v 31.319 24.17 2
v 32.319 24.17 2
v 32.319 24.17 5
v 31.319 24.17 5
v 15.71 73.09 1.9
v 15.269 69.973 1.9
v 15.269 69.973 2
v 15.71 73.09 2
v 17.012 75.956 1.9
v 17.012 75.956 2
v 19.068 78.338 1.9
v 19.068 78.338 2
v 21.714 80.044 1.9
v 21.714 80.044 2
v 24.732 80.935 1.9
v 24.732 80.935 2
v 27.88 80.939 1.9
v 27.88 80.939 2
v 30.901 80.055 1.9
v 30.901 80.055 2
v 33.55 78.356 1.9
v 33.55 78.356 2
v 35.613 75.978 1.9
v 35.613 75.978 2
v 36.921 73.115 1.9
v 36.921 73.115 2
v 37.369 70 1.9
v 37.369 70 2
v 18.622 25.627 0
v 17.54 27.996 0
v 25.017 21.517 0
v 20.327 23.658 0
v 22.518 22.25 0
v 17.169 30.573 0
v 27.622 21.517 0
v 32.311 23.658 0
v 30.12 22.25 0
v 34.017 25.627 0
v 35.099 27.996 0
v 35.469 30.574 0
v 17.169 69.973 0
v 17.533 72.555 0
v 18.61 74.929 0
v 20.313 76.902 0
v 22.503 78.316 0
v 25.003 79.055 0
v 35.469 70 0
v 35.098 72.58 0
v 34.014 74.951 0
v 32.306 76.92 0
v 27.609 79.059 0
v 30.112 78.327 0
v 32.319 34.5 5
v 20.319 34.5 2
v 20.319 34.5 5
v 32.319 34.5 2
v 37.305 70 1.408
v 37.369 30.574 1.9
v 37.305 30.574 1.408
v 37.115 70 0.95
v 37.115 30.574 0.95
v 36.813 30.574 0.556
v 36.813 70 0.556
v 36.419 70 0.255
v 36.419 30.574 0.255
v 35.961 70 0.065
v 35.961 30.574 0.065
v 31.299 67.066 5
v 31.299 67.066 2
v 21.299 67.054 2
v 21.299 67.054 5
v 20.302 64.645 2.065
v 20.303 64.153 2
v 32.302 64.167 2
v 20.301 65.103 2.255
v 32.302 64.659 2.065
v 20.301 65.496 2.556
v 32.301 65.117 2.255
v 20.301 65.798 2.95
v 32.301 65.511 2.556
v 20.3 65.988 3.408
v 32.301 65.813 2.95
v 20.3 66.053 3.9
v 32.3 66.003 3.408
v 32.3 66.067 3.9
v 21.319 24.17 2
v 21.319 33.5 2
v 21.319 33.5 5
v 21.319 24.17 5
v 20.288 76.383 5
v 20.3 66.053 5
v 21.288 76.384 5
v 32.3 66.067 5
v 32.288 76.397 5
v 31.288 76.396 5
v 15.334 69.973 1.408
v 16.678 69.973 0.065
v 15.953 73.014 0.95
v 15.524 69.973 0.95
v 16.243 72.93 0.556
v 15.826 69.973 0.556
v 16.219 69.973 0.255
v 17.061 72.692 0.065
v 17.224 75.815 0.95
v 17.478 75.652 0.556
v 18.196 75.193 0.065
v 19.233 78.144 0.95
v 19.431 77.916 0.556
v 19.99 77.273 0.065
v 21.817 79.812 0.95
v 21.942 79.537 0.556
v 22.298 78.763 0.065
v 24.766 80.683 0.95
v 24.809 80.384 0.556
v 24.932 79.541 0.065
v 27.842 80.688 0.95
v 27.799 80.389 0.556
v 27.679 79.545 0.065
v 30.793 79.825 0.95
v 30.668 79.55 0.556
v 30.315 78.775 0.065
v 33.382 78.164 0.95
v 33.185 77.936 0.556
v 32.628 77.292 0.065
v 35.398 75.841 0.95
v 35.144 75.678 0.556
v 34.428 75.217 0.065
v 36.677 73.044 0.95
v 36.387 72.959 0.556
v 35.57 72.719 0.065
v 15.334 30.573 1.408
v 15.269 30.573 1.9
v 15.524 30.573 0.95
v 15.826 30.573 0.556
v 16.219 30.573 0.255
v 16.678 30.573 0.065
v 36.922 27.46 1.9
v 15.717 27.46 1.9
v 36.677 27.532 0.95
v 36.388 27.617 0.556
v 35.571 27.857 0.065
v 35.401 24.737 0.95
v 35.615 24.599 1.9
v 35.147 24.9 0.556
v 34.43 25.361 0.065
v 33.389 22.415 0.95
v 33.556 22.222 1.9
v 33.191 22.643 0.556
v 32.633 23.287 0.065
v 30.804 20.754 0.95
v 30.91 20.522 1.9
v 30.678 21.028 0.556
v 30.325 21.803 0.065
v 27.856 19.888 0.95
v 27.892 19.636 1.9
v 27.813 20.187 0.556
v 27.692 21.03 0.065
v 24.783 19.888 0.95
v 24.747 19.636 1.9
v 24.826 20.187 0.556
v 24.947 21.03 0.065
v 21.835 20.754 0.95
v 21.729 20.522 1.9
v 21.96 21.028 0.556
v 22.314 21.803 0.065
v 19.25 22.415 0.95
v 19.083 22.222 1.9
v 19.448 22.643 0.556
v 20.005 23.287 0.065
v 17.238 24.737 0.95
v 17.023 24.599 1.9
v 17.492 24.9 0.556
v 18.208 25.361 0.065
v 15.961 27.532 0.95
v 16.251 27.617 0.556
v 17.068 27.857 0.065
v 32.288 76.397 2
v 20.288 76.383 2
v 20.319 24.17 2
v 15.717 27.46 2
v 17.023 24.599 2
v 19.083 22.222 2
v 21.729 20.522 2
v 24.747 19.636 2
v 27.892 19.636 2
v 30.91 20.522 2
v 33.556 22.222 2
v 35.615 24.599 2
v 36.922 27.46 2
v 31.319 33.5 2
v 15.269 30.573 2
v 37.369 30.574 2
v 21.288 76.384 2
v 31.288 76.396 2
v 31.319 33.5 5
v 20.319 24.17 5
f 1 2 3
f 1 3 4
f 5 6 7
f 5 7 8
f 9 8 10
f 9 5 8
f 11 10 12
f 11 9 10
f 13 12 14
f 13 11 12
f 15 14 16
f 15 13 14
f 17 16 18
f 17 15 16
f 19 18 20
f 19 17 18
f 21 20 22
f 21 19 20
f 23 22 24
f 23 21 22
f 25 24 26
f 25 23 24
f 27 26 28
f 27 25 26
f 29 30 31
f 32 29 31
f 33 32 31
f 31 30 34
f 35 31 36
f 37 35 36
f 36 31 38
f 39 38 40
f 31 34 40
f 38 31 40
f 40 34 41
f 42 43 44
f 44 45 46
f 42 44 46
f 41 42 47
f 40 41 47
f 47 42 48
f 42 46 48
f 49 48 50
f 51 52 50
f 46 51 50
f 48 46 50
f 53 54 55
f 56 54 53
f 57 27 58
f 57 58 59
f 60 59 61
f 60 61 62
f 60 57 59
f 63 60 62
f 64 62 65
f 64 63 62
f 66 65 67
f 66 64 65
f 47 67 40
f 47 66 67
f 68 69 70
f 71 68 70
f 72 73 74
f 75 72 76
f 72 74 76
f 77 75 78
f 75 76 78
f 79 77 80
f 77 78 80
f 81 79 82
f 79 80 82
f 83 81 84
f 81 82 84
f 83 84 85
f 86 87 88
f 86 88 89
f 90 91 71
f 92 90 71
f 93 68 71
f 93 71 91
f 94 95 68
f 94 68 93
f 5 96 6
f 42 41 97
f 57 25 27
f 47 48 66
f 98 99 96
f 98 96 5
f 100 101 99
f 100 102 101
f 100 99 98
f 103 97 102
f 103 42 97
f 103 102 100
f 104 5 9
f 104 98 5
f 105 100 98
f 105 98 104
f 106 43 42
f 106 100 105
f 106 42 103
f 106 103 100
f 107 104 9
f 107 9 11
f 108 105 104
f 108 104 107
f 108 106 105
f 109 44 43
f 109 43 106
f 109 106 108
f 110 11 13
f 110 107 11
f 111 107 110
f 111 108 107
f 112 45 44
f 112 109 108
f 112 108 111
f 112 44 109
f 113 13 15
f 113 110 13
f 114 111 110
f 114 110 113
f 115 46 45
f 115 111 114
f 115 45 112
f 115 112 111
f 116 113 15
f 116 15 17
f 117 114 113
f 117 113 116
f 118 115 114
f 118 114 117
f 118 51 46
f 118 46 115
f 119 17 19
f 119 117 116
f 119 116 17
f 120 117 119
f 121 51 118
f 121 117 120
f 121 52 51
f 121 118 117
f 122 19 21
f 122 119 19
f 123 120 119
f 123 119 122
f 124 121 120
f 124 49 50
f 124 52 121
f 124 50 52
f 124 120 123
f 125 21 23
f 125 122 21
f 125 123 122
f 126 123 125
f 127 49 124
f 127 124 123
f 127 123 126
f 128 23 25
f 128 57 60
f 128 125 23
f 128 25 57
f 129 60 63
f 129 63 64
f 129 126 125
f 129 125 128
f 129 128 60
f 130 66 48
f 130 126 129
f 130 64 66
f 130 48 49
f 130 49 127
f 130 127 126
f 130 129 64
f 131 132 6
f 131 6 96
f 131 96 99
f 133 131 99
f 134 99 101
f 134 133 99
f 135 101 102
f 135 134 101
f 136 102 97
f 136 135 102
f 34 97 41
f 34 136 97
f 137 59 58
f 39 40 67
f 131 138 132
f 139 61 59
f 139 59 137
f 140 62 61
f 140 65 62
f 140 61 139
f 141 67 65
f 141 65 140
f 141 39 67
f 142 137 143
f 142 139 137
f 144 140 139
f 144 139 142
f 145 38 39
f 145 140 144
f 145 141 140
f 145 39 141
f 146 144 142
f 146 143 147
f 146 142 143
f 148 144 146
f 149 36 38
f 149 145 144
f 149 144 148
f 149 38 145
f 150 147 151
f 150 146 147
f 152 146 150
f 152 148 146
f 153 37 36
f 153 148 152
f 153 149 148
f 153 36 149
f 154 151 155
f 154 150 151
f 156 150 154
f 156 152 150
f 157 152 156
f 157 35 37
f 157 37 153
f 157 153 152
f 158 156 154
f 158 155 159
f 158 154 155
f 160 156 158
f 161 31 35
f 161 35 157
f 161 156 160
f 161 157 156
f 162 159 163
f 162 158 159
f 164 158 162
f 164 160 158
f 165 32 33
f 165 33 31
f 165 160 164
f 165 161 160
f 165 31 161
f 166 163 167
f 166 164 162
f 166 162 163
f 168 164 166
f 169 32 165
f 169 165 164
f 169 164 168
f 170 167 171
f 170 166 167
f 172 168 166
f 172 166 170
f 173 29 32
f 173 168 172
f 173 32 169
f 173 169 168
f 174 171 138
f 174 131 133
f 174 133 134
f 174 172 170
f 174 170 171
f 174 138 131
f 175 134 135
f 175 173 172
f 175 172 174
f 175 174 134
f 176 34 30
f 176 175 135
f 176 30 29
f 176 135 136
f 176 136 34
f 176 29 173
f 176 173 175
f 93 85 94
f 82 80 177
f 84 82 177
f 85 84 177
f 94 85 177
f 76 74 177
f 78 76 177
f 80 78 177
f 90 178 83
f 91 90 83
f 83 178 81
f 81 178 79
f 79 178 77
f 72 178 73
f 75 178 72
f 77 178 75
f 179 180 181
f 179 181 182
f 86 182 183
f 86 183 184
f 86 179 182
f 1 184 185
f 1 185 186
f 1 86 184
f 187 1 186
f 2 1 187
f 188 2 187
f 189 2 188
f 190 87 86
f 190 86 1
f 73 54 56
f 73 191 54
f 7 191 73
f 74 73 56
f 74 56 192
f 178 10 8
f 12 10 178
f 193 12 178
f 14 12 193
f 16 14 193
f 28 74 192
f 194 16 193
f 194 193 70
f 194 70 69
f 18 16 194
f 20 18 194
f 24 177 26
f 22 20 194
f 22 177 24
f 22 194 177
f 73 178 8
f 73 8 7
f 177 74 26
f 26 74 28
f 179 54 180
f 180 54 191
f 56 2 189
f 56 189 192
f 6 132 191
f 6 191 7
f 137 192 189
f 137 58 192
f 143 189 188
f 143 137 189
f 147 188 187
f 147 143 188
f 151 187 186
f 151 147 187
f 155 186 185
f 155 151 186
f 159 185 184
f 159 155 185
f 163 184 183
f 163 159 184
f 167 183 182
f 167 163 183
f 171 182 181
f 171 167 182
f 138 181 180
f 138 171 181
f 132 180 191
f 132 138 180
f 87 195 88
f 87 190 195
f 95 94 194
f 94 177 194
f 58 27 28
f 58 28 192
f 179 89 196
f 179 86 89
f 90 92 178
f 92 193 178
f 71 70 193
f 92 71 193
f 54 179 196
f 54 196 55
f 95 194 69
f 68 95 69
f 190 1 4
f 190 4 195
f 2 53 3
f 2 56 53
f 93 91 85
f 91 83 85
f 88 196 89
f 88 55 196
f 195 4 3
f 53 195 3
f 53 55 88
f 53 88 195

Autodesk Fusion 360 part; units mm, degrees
sketch "Boceto1" plane through (0, 0, 0) normal (0, 0, 1) x (1, 0, 0)
  line L0 (37.3693, 70) -> (37.3693, 30.5735)
  line L1 (15.2693, 30.5734) -> (15.2693, 69.9734)
  arc A0 (15.2693, 30.5734) -> (37.3693, 30.5735) centre (26.3193, 30.5735) ccw
  arc A1 (37.3693, 70) -> (15.2693, 69.9734) centre (26.3193, 70) ccw
  line L2 (20.3193, 24.17) -> (20.3193, 34.5)
  line L3 (20.3193, 34.5) -> (32.3193, 34.5)
  line L4 (32.3193, 34.5) -> (32.3193, 24.17)
  line L5 (32.3193, 24.17) -> (31.3193, 24.17)
  line L6 (31.3193, 24.17) -> (31.3193, 33.5)
  line L7 (31.3193, 33.5) -> (21.3193, 33.5)
  line L8 (21.3193, 33.5) -> (21.3193, 24.17)
  line L9 (21.3193, 24.17) -> (20.3193, 24.17)
  line L10 (15.2693, 30.5734) -> (15.2693, 50.2734)
  line L11 (20.2878, 76.3829) -> (20.3003, 66.0529)
  line L12 (20.3003, 66.0529) -> (32.3002, 66.0673)
  line L13 (32.3002, 66.0673) -> (32.2878, 76.3973)
  line L14 (32.2878, 76.3973) -> (31.2878, 76.3961)
  line L15 (31.2878, 76.3961) -> (31.299, 67.0661)
  line L16 (31.299, 67.0661) -> (21.2991, 67.0541)
  line L17 (21.2991, 67.0541) -> (21.2878, 76.3841)
  line L18 (21.2878, 76.3841) -> (20.2878, 76.3829)
  dimension "d1" = 39.4
  dimension "d2" = 22.1
  dimension "d11" = 1
  dimension "d12" = 1
  dimension "d13" = 10
  dimension "d14" = 12
  dimension "d15" = 10.33
  dimension "d16" = 1
  dimension "d25" = 10.33
extrude "Extruir2" add sketch "Boceto1" along normal blind 5 contours L11 L12 L13 L14 L15 L16 L17 L18 makes body 1
extrude "Extruir3" add sketch "Boceto1" along normal blind 5 separate body contours L2 L3 L4 L5 L6 L7 L8 L9 makes body 2
extrude "Extruir4" add sketch "Boceto1" along normal blind 2 bodies 1 2
fillet "Empalme2" radius 1.9 5 edges at (26.3003, 66.0601, 2) (15.2693, 50.2734, 0) (26.3193, 19.5235, 0) (37.3693, 50.2867, 0) (26.306, 81.05, 0) on bodies 1
